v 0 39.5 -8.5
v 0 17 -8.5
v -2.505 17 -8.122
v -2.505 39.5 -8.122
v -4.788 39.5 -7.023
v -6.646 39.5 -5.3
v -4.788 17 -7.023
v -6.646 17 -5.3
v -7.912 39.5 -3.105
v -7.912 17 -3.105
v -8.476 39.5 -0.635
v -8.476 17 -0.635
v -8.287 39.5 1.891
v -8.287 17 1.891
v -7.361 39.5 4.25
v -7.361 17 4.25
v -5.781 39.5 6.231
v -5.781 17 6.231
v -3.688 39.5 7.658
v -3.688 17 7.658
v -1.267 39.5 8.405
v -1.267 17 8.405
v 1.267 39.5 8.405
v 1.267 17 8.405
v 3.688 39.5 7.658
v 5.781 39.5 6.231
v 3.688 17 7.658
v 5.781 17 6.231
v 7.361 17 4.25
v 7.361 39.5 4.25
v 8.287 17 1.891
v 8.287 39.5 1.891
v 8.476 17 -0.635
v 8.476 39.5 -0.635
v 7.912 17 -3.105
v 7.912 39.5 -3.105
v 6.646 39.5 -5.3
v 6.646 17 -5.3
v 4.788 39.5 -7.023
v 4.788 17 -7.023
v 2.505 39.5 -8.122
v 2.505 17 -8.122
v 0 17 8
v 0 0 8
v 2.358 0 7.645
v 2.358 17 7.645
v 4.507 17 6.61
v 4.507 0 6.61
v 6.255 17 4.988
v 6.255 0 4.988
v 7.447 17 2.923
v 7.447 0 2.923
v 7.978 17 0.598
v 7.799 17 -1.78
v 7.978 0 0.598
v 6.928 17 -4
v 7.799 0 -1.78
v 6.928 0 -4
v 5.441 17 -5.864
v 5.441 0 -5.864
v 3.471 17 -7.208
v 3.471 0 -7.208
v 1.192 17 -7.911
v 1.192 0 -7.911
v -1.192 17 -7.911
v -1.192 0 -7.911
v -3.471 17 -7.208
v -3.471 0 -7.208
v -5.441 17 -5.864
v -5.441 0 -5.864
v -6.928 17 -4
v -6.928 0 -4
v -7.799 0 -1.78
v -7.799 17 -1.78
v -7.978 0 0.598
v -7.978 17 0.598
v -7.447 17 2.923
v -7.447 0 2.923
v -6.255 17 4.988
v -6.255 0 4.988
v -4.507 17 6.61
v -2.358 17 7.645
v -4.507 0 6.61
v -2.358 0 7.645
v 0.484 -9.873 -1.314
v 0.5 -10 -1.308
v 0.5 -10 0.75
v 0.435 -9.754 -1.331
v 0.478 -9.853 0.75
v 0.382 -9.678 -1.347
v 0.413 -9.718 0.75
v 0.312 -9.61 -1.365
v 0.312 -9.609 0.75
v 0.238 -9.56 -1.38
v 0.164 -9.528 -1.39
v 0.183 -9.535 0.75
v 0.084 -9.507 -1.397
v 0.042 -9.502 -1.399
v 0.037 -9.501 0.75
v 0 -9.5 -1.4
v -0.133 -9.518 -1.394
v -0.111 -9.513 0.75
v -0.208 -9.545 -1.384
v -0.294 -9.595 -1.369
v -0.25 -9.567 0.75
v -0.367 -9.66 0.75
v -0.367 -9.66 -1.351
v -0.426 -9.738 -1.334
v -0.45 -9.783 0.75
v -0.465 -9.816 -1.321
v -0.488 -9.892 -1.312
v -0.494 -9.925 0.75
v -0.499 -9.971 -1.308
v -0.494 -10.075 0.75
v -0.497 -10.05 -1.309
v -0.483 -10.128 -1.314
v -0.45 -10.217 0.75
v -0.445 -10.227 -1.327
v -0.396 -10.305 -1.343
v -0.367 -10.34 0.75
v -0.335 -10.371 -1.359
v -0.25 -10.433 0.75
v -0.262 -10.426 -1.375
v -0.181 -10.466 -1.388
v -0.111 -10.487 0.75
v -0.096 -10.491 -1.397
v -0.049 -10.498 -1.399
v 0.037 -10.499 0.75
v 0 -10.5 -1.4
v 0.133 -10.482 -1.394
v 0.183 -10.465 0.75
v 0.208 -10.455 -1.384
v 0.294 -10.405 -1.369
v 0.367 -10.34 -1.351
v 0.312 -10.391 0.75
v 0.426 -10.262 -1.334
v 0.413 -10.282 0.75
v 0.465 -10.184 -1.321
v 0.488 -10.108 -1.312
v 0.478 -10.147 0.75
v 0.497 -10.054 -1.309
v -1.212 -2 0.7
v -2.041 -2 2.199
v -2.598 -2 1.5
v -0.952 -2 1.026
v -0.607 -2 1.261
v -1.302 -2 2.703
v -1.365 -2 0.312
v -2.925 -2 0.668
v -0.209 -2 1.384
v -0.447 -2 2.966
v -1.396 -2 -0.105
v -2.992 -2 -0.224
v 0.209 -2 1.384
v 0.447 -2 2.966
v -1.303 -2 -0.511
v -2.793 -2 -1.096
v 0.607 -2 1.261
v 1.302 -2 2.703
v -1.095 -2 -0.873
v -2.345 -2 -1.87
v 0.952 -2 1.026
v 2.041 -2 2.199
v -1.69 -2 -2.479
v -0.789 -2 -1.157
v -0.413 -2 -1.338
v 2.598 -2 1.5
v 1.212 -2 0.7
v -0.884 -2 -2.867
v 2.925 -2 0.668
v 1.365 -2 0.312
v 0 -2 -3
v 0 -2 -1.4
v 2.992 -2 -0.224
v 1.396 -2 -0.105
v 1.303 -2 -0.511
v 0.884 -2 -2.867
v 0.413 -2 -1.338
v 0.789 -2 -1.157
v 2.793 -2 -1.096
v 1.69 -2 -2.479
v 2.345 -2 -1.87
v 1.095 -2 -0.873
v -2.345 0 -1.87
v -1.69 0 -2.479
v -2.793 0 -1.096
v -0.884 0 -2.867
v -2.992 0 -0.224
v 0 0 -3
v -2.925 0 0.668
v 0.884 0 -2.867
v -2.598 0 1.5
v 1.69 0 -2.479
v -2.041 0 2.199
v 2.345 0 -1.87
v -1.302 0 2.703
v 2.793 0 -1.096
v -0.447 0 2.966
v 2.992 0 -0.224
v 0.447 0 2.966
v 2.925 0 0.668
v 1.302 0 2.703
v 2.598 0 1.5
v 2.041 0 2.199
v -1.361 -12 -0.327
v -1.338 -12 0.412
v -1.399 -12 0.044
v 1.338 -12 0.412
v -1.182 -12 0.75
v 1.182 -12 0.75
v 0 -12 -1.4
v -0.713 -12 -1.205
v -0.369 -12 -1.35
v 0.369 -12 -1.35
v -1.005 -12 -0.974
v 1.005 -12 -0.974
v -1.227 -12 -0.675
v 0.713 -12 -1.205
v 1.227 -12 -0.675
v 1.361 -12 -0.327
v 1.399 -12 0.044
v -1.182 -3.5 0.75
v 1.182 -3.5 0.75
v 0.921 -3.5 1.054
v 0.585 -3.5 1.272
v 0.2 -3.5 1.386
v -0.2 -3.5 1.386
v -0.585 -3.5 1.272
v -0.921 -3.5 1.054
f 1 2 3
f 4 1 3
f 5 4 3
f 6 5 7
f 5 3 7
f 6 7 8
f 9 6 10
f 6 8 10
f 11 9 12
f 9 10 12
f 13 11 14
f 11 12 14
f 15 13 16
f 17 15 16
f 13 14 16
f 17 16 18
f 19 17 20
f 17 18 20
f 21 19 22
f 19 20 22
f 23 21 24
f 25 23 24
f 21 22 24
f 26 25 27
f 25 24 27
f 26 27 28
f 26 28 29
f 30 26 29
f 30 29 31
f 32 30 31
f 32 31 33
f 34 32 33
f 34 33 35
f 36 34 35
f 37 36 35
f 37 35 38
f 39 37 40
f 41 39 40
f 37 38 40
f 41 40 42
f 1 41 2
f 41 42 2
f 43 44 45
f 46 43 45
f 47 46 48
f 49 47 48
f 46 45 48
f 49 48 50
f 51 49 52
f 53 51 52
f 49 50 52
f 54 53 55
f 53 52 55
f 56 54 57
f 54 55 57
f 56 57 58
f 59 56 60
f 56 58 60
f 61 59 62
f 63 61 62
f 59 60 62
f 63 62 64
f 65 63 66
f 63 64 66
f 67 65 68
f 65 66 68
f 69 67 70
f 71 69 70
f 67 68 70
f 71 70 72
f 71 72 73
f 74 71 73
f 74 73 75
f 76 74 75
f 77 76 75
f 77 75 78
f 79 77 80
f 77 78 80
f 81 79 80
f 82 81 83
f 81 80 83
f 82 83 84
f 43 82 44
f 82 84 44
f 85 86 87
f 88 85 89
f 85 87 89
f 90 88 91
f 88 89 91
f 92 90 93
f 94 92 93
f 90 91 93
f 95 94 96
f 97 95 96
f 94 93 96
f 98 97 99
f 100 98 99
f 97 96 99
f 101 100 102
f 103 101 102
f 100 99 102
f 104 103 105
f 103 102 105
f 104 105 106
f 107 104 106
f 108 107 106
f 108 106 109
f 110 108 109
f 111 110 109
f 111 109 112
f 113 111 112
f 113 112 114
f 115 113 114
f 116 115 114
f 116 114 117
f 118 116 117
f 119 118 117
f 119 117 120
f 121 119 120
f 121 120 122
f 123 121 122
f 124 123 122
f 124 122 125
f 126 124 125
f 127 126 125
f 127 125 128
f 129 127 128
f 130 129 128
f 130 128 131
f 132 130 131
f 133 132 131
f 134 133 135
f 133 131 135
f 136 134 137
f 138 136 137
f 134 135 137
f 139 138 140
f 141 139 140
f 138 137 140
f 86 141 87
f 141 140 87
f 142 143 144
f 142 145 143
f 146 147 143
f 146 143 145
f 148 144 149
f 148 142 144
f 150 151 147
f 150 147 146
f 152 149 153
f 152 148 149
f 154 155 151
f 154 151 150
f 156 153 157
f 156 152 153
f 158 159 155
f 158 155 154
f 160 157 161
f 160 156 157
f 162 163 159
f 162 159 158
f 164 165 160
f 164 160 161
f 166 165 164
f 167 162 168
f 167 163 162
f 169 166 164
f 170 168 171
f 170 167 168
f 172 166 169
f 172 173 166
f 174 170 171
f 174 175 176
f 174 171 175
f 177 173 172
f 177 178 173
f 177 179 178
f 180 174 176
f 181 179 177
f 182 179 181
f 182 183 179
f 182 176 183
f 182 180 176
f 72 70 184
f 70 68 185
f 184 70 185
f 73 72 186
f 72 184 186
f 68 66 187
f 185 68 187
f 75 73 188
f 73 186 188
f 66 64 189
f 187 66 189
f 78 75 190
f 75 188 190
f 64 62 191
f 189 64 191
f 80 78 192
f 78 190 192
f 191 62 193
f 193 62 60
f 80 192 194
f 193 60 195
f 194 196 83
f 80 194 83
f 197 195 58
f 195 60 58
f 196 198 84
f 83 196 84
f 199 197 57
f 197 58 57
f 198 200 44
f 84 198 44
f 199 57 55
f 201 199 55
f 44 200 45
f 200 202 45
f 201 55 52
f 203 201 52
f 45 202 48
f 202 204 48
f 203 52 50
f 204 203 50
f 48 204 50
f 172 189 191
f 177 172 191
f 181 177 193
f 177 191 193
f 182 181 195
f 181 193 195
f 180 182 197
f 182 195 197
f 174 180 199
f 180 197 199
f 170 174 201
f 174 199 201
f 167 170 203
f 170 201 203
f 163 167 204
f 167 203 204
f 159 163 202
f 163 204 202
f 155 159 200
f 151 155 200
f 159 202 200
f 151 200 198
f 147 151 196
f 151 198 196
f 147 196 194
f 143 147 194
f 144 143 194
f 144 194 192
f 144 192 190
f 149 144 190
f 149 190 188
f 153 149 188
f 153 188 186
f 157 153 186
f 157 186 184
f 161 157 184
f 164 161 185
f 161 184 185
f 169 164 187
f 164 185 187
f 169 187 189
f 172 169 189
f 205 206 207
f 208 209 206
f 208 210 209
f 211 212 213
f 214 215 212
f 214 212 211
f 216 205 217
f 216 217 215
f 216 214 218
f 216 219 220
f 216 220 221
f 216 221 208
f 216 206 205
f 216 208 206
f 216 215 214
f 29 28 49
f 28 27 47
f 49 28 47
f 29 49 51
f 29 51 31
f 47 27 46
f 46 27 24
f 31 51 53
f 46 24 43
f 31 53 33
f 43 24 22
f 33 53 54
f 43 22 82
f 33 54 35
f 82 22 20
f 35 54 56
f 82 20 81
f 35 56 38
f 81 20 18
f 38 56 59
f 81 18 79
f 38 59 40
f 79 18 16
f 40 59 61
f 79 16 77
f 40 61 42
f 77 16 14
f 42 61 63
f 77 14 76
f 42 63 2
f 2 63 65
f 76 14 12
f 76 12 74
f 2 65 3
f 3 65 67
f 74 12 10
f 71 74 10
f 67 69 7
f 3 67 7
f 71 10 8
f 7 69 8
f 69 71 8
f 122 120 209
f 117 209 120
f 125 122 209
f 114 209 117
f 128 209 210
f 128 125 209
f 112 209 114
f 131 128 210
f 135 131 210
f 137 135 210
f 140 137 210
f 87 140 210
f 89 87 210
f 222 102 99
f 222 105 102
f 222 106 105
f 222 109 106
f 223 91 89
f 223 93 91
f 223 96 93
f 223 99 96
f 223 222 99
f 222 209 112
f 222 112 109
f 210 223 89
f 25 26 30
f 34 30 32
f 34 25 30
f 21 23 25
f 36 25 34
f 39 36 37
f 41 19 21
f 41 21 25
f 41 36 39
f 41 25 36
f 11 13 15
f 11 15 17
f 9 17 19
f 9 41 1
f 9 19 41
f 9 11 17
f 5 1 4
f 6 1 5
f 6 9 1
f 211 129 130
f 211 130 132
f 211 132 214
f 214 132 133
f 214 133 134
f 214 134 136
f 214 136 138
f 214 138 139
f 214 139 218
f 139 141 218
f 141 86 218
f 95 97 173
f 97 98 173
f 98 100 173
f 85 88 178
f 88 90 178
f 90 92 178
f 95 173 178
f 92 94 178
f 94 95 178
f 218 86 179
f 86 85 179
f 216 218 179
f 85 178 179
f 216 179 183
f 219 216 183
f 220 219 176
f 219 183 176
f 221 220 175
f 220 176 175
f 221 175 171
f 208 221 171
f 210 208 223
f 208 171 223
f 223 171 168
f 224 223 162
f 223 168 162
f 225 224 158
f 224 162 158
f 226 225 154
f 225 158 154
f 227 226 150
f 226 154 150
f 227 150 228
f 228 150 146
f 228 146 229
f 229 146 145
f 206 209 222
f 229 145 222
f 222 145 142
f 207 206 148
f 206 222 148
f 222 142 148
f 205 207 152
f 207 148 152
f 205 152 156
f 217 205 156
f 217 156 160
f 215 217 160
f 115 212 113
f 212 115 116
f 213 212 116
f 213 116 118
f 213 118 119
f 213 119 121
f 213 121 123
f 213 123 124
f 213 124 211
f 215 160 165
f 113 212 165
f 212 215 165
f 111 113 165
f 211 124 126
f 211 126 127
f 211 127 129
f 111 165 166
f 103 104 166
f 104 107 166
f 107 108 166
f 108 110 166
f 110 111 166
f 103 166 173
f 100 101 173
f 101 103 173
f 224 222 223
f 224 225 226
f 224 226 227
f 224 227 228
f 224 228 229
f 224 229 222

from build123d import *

# Parameters (mm, degrees)
SKETCH1_R               = 8
BOSS_EXTRUDE1_DEPTH     = 17
SKETCH2_R               = 8.5
BOSS_EXTRUDE2_DEPTH     = 22.5
SKETCH3_R               = 3
BOSS_EXTRUDE3_DEPTH     = 2
SKETCH4_R               = 1.4
BOSS_EXTRUDE4_DEPTH     = 10
CUT_EXTRUDE1_START      = -8.5
CUT_EXTRUDE1_DEPTH      = 8.5
CUT_EXTRUDE2_REACH      = 43.45
CUT_EXTRUDE2_END_RADIUS = 1.4
SKETCH6_R               = 0.5


with BuildPart() as part:
    # Sketch1 → Boss-Extrude1 (new body)
    with BuildSketch(Plane(origin=(0, 0, 0), x_dir=(1, 0, 0), z_dir=(0, 1, 0))):
        with Locations(Location((0, 0, 0), (0, 0, 270))):
            Circle(SKETCH1_R)
    extrude(amount=BOSS_EXTRUDE1_DEPTH)

    # Sketch2 → Boss-Extrude2 (add)
    with BuildSketch(Plane(origin=(0, 17, 0), x_dir=(1, 0, 0), z_dir=(0, 1, 0))):
        with Locations(Location((0, 0, 0), (0, 0, 90))):
            Circle(SKETCH2_R)
    extrude(amount=BOSS_EXTRUDE2_DEPTH)

    # Sketch3 → Boss-Extrude3 (add)
    with BuildSketch(Plane.XZ):
        with Locations(Location((0, 0, 0), (0, 0, 270))):
            Circle(SKETCH3_R)
    extrude(amount=BOSS_EXTRUDE3_DEPTH)

    # Sketch4 → Boss-Extrude4 (add)
    with BuildSketch(Plane.XZ.offset(2)):
        with Locations(Location((0, 0, 0), (0, 0, 270))):
            Circle(SKETCH4_R)
    extrude(amount=BOSS_EXTRUDE4_DEPTH)

    # Sketch5 → Cut-Extrude1 (cut)
    with BuildSketch(Plane.XZ.offset(12).offset(CUT_EXTRUDE1_START)):
        with BuildLine():
            Line((-1.182159042, 0.75), (1.182159042, 0.75))
            ThreePointArc((1.182159042, 0.75), (0, 1.4), (-1.182159042, 0.75))
        make_face()
    extrude(amount=CUT_EXTRUDE1_DEPTH, mode=Mode.SUBTRACT)

    # Cut-Extrude2: up to this cylinder (the profile starts inside it)
    cut_extrude2_end = Plane(origin=(0, -10, 0), z_dir=(0, 1, 0)) * Cylinder(CUT_EXTRUDE2_END_RADIUS, 90.7, mode=Mode.PRIVATE)
    # Sketch6 → Cut-Extrude2 (cut, up to the surface)
    with BuildSketch(Plane.XY.offset(0.75), mode=Mode.PRIVATE) as cut_extrude2_sk1:
        with Locations((0, -10)):
            Circle(SKETCH6_R)
    cut_extrude2_tool1 = extrude(cut_extrude2_sk1.sketch, amount=-CUT_EXTRUDE2_REACH, mode=Mode.PRIVATE) & cut_extrude2_end
    add(cut_extrude2_tool1.solids().sort_by_distance((0, -10, 0.75))[0], mode=Mode.SUBTRACT)


solid = part.part
